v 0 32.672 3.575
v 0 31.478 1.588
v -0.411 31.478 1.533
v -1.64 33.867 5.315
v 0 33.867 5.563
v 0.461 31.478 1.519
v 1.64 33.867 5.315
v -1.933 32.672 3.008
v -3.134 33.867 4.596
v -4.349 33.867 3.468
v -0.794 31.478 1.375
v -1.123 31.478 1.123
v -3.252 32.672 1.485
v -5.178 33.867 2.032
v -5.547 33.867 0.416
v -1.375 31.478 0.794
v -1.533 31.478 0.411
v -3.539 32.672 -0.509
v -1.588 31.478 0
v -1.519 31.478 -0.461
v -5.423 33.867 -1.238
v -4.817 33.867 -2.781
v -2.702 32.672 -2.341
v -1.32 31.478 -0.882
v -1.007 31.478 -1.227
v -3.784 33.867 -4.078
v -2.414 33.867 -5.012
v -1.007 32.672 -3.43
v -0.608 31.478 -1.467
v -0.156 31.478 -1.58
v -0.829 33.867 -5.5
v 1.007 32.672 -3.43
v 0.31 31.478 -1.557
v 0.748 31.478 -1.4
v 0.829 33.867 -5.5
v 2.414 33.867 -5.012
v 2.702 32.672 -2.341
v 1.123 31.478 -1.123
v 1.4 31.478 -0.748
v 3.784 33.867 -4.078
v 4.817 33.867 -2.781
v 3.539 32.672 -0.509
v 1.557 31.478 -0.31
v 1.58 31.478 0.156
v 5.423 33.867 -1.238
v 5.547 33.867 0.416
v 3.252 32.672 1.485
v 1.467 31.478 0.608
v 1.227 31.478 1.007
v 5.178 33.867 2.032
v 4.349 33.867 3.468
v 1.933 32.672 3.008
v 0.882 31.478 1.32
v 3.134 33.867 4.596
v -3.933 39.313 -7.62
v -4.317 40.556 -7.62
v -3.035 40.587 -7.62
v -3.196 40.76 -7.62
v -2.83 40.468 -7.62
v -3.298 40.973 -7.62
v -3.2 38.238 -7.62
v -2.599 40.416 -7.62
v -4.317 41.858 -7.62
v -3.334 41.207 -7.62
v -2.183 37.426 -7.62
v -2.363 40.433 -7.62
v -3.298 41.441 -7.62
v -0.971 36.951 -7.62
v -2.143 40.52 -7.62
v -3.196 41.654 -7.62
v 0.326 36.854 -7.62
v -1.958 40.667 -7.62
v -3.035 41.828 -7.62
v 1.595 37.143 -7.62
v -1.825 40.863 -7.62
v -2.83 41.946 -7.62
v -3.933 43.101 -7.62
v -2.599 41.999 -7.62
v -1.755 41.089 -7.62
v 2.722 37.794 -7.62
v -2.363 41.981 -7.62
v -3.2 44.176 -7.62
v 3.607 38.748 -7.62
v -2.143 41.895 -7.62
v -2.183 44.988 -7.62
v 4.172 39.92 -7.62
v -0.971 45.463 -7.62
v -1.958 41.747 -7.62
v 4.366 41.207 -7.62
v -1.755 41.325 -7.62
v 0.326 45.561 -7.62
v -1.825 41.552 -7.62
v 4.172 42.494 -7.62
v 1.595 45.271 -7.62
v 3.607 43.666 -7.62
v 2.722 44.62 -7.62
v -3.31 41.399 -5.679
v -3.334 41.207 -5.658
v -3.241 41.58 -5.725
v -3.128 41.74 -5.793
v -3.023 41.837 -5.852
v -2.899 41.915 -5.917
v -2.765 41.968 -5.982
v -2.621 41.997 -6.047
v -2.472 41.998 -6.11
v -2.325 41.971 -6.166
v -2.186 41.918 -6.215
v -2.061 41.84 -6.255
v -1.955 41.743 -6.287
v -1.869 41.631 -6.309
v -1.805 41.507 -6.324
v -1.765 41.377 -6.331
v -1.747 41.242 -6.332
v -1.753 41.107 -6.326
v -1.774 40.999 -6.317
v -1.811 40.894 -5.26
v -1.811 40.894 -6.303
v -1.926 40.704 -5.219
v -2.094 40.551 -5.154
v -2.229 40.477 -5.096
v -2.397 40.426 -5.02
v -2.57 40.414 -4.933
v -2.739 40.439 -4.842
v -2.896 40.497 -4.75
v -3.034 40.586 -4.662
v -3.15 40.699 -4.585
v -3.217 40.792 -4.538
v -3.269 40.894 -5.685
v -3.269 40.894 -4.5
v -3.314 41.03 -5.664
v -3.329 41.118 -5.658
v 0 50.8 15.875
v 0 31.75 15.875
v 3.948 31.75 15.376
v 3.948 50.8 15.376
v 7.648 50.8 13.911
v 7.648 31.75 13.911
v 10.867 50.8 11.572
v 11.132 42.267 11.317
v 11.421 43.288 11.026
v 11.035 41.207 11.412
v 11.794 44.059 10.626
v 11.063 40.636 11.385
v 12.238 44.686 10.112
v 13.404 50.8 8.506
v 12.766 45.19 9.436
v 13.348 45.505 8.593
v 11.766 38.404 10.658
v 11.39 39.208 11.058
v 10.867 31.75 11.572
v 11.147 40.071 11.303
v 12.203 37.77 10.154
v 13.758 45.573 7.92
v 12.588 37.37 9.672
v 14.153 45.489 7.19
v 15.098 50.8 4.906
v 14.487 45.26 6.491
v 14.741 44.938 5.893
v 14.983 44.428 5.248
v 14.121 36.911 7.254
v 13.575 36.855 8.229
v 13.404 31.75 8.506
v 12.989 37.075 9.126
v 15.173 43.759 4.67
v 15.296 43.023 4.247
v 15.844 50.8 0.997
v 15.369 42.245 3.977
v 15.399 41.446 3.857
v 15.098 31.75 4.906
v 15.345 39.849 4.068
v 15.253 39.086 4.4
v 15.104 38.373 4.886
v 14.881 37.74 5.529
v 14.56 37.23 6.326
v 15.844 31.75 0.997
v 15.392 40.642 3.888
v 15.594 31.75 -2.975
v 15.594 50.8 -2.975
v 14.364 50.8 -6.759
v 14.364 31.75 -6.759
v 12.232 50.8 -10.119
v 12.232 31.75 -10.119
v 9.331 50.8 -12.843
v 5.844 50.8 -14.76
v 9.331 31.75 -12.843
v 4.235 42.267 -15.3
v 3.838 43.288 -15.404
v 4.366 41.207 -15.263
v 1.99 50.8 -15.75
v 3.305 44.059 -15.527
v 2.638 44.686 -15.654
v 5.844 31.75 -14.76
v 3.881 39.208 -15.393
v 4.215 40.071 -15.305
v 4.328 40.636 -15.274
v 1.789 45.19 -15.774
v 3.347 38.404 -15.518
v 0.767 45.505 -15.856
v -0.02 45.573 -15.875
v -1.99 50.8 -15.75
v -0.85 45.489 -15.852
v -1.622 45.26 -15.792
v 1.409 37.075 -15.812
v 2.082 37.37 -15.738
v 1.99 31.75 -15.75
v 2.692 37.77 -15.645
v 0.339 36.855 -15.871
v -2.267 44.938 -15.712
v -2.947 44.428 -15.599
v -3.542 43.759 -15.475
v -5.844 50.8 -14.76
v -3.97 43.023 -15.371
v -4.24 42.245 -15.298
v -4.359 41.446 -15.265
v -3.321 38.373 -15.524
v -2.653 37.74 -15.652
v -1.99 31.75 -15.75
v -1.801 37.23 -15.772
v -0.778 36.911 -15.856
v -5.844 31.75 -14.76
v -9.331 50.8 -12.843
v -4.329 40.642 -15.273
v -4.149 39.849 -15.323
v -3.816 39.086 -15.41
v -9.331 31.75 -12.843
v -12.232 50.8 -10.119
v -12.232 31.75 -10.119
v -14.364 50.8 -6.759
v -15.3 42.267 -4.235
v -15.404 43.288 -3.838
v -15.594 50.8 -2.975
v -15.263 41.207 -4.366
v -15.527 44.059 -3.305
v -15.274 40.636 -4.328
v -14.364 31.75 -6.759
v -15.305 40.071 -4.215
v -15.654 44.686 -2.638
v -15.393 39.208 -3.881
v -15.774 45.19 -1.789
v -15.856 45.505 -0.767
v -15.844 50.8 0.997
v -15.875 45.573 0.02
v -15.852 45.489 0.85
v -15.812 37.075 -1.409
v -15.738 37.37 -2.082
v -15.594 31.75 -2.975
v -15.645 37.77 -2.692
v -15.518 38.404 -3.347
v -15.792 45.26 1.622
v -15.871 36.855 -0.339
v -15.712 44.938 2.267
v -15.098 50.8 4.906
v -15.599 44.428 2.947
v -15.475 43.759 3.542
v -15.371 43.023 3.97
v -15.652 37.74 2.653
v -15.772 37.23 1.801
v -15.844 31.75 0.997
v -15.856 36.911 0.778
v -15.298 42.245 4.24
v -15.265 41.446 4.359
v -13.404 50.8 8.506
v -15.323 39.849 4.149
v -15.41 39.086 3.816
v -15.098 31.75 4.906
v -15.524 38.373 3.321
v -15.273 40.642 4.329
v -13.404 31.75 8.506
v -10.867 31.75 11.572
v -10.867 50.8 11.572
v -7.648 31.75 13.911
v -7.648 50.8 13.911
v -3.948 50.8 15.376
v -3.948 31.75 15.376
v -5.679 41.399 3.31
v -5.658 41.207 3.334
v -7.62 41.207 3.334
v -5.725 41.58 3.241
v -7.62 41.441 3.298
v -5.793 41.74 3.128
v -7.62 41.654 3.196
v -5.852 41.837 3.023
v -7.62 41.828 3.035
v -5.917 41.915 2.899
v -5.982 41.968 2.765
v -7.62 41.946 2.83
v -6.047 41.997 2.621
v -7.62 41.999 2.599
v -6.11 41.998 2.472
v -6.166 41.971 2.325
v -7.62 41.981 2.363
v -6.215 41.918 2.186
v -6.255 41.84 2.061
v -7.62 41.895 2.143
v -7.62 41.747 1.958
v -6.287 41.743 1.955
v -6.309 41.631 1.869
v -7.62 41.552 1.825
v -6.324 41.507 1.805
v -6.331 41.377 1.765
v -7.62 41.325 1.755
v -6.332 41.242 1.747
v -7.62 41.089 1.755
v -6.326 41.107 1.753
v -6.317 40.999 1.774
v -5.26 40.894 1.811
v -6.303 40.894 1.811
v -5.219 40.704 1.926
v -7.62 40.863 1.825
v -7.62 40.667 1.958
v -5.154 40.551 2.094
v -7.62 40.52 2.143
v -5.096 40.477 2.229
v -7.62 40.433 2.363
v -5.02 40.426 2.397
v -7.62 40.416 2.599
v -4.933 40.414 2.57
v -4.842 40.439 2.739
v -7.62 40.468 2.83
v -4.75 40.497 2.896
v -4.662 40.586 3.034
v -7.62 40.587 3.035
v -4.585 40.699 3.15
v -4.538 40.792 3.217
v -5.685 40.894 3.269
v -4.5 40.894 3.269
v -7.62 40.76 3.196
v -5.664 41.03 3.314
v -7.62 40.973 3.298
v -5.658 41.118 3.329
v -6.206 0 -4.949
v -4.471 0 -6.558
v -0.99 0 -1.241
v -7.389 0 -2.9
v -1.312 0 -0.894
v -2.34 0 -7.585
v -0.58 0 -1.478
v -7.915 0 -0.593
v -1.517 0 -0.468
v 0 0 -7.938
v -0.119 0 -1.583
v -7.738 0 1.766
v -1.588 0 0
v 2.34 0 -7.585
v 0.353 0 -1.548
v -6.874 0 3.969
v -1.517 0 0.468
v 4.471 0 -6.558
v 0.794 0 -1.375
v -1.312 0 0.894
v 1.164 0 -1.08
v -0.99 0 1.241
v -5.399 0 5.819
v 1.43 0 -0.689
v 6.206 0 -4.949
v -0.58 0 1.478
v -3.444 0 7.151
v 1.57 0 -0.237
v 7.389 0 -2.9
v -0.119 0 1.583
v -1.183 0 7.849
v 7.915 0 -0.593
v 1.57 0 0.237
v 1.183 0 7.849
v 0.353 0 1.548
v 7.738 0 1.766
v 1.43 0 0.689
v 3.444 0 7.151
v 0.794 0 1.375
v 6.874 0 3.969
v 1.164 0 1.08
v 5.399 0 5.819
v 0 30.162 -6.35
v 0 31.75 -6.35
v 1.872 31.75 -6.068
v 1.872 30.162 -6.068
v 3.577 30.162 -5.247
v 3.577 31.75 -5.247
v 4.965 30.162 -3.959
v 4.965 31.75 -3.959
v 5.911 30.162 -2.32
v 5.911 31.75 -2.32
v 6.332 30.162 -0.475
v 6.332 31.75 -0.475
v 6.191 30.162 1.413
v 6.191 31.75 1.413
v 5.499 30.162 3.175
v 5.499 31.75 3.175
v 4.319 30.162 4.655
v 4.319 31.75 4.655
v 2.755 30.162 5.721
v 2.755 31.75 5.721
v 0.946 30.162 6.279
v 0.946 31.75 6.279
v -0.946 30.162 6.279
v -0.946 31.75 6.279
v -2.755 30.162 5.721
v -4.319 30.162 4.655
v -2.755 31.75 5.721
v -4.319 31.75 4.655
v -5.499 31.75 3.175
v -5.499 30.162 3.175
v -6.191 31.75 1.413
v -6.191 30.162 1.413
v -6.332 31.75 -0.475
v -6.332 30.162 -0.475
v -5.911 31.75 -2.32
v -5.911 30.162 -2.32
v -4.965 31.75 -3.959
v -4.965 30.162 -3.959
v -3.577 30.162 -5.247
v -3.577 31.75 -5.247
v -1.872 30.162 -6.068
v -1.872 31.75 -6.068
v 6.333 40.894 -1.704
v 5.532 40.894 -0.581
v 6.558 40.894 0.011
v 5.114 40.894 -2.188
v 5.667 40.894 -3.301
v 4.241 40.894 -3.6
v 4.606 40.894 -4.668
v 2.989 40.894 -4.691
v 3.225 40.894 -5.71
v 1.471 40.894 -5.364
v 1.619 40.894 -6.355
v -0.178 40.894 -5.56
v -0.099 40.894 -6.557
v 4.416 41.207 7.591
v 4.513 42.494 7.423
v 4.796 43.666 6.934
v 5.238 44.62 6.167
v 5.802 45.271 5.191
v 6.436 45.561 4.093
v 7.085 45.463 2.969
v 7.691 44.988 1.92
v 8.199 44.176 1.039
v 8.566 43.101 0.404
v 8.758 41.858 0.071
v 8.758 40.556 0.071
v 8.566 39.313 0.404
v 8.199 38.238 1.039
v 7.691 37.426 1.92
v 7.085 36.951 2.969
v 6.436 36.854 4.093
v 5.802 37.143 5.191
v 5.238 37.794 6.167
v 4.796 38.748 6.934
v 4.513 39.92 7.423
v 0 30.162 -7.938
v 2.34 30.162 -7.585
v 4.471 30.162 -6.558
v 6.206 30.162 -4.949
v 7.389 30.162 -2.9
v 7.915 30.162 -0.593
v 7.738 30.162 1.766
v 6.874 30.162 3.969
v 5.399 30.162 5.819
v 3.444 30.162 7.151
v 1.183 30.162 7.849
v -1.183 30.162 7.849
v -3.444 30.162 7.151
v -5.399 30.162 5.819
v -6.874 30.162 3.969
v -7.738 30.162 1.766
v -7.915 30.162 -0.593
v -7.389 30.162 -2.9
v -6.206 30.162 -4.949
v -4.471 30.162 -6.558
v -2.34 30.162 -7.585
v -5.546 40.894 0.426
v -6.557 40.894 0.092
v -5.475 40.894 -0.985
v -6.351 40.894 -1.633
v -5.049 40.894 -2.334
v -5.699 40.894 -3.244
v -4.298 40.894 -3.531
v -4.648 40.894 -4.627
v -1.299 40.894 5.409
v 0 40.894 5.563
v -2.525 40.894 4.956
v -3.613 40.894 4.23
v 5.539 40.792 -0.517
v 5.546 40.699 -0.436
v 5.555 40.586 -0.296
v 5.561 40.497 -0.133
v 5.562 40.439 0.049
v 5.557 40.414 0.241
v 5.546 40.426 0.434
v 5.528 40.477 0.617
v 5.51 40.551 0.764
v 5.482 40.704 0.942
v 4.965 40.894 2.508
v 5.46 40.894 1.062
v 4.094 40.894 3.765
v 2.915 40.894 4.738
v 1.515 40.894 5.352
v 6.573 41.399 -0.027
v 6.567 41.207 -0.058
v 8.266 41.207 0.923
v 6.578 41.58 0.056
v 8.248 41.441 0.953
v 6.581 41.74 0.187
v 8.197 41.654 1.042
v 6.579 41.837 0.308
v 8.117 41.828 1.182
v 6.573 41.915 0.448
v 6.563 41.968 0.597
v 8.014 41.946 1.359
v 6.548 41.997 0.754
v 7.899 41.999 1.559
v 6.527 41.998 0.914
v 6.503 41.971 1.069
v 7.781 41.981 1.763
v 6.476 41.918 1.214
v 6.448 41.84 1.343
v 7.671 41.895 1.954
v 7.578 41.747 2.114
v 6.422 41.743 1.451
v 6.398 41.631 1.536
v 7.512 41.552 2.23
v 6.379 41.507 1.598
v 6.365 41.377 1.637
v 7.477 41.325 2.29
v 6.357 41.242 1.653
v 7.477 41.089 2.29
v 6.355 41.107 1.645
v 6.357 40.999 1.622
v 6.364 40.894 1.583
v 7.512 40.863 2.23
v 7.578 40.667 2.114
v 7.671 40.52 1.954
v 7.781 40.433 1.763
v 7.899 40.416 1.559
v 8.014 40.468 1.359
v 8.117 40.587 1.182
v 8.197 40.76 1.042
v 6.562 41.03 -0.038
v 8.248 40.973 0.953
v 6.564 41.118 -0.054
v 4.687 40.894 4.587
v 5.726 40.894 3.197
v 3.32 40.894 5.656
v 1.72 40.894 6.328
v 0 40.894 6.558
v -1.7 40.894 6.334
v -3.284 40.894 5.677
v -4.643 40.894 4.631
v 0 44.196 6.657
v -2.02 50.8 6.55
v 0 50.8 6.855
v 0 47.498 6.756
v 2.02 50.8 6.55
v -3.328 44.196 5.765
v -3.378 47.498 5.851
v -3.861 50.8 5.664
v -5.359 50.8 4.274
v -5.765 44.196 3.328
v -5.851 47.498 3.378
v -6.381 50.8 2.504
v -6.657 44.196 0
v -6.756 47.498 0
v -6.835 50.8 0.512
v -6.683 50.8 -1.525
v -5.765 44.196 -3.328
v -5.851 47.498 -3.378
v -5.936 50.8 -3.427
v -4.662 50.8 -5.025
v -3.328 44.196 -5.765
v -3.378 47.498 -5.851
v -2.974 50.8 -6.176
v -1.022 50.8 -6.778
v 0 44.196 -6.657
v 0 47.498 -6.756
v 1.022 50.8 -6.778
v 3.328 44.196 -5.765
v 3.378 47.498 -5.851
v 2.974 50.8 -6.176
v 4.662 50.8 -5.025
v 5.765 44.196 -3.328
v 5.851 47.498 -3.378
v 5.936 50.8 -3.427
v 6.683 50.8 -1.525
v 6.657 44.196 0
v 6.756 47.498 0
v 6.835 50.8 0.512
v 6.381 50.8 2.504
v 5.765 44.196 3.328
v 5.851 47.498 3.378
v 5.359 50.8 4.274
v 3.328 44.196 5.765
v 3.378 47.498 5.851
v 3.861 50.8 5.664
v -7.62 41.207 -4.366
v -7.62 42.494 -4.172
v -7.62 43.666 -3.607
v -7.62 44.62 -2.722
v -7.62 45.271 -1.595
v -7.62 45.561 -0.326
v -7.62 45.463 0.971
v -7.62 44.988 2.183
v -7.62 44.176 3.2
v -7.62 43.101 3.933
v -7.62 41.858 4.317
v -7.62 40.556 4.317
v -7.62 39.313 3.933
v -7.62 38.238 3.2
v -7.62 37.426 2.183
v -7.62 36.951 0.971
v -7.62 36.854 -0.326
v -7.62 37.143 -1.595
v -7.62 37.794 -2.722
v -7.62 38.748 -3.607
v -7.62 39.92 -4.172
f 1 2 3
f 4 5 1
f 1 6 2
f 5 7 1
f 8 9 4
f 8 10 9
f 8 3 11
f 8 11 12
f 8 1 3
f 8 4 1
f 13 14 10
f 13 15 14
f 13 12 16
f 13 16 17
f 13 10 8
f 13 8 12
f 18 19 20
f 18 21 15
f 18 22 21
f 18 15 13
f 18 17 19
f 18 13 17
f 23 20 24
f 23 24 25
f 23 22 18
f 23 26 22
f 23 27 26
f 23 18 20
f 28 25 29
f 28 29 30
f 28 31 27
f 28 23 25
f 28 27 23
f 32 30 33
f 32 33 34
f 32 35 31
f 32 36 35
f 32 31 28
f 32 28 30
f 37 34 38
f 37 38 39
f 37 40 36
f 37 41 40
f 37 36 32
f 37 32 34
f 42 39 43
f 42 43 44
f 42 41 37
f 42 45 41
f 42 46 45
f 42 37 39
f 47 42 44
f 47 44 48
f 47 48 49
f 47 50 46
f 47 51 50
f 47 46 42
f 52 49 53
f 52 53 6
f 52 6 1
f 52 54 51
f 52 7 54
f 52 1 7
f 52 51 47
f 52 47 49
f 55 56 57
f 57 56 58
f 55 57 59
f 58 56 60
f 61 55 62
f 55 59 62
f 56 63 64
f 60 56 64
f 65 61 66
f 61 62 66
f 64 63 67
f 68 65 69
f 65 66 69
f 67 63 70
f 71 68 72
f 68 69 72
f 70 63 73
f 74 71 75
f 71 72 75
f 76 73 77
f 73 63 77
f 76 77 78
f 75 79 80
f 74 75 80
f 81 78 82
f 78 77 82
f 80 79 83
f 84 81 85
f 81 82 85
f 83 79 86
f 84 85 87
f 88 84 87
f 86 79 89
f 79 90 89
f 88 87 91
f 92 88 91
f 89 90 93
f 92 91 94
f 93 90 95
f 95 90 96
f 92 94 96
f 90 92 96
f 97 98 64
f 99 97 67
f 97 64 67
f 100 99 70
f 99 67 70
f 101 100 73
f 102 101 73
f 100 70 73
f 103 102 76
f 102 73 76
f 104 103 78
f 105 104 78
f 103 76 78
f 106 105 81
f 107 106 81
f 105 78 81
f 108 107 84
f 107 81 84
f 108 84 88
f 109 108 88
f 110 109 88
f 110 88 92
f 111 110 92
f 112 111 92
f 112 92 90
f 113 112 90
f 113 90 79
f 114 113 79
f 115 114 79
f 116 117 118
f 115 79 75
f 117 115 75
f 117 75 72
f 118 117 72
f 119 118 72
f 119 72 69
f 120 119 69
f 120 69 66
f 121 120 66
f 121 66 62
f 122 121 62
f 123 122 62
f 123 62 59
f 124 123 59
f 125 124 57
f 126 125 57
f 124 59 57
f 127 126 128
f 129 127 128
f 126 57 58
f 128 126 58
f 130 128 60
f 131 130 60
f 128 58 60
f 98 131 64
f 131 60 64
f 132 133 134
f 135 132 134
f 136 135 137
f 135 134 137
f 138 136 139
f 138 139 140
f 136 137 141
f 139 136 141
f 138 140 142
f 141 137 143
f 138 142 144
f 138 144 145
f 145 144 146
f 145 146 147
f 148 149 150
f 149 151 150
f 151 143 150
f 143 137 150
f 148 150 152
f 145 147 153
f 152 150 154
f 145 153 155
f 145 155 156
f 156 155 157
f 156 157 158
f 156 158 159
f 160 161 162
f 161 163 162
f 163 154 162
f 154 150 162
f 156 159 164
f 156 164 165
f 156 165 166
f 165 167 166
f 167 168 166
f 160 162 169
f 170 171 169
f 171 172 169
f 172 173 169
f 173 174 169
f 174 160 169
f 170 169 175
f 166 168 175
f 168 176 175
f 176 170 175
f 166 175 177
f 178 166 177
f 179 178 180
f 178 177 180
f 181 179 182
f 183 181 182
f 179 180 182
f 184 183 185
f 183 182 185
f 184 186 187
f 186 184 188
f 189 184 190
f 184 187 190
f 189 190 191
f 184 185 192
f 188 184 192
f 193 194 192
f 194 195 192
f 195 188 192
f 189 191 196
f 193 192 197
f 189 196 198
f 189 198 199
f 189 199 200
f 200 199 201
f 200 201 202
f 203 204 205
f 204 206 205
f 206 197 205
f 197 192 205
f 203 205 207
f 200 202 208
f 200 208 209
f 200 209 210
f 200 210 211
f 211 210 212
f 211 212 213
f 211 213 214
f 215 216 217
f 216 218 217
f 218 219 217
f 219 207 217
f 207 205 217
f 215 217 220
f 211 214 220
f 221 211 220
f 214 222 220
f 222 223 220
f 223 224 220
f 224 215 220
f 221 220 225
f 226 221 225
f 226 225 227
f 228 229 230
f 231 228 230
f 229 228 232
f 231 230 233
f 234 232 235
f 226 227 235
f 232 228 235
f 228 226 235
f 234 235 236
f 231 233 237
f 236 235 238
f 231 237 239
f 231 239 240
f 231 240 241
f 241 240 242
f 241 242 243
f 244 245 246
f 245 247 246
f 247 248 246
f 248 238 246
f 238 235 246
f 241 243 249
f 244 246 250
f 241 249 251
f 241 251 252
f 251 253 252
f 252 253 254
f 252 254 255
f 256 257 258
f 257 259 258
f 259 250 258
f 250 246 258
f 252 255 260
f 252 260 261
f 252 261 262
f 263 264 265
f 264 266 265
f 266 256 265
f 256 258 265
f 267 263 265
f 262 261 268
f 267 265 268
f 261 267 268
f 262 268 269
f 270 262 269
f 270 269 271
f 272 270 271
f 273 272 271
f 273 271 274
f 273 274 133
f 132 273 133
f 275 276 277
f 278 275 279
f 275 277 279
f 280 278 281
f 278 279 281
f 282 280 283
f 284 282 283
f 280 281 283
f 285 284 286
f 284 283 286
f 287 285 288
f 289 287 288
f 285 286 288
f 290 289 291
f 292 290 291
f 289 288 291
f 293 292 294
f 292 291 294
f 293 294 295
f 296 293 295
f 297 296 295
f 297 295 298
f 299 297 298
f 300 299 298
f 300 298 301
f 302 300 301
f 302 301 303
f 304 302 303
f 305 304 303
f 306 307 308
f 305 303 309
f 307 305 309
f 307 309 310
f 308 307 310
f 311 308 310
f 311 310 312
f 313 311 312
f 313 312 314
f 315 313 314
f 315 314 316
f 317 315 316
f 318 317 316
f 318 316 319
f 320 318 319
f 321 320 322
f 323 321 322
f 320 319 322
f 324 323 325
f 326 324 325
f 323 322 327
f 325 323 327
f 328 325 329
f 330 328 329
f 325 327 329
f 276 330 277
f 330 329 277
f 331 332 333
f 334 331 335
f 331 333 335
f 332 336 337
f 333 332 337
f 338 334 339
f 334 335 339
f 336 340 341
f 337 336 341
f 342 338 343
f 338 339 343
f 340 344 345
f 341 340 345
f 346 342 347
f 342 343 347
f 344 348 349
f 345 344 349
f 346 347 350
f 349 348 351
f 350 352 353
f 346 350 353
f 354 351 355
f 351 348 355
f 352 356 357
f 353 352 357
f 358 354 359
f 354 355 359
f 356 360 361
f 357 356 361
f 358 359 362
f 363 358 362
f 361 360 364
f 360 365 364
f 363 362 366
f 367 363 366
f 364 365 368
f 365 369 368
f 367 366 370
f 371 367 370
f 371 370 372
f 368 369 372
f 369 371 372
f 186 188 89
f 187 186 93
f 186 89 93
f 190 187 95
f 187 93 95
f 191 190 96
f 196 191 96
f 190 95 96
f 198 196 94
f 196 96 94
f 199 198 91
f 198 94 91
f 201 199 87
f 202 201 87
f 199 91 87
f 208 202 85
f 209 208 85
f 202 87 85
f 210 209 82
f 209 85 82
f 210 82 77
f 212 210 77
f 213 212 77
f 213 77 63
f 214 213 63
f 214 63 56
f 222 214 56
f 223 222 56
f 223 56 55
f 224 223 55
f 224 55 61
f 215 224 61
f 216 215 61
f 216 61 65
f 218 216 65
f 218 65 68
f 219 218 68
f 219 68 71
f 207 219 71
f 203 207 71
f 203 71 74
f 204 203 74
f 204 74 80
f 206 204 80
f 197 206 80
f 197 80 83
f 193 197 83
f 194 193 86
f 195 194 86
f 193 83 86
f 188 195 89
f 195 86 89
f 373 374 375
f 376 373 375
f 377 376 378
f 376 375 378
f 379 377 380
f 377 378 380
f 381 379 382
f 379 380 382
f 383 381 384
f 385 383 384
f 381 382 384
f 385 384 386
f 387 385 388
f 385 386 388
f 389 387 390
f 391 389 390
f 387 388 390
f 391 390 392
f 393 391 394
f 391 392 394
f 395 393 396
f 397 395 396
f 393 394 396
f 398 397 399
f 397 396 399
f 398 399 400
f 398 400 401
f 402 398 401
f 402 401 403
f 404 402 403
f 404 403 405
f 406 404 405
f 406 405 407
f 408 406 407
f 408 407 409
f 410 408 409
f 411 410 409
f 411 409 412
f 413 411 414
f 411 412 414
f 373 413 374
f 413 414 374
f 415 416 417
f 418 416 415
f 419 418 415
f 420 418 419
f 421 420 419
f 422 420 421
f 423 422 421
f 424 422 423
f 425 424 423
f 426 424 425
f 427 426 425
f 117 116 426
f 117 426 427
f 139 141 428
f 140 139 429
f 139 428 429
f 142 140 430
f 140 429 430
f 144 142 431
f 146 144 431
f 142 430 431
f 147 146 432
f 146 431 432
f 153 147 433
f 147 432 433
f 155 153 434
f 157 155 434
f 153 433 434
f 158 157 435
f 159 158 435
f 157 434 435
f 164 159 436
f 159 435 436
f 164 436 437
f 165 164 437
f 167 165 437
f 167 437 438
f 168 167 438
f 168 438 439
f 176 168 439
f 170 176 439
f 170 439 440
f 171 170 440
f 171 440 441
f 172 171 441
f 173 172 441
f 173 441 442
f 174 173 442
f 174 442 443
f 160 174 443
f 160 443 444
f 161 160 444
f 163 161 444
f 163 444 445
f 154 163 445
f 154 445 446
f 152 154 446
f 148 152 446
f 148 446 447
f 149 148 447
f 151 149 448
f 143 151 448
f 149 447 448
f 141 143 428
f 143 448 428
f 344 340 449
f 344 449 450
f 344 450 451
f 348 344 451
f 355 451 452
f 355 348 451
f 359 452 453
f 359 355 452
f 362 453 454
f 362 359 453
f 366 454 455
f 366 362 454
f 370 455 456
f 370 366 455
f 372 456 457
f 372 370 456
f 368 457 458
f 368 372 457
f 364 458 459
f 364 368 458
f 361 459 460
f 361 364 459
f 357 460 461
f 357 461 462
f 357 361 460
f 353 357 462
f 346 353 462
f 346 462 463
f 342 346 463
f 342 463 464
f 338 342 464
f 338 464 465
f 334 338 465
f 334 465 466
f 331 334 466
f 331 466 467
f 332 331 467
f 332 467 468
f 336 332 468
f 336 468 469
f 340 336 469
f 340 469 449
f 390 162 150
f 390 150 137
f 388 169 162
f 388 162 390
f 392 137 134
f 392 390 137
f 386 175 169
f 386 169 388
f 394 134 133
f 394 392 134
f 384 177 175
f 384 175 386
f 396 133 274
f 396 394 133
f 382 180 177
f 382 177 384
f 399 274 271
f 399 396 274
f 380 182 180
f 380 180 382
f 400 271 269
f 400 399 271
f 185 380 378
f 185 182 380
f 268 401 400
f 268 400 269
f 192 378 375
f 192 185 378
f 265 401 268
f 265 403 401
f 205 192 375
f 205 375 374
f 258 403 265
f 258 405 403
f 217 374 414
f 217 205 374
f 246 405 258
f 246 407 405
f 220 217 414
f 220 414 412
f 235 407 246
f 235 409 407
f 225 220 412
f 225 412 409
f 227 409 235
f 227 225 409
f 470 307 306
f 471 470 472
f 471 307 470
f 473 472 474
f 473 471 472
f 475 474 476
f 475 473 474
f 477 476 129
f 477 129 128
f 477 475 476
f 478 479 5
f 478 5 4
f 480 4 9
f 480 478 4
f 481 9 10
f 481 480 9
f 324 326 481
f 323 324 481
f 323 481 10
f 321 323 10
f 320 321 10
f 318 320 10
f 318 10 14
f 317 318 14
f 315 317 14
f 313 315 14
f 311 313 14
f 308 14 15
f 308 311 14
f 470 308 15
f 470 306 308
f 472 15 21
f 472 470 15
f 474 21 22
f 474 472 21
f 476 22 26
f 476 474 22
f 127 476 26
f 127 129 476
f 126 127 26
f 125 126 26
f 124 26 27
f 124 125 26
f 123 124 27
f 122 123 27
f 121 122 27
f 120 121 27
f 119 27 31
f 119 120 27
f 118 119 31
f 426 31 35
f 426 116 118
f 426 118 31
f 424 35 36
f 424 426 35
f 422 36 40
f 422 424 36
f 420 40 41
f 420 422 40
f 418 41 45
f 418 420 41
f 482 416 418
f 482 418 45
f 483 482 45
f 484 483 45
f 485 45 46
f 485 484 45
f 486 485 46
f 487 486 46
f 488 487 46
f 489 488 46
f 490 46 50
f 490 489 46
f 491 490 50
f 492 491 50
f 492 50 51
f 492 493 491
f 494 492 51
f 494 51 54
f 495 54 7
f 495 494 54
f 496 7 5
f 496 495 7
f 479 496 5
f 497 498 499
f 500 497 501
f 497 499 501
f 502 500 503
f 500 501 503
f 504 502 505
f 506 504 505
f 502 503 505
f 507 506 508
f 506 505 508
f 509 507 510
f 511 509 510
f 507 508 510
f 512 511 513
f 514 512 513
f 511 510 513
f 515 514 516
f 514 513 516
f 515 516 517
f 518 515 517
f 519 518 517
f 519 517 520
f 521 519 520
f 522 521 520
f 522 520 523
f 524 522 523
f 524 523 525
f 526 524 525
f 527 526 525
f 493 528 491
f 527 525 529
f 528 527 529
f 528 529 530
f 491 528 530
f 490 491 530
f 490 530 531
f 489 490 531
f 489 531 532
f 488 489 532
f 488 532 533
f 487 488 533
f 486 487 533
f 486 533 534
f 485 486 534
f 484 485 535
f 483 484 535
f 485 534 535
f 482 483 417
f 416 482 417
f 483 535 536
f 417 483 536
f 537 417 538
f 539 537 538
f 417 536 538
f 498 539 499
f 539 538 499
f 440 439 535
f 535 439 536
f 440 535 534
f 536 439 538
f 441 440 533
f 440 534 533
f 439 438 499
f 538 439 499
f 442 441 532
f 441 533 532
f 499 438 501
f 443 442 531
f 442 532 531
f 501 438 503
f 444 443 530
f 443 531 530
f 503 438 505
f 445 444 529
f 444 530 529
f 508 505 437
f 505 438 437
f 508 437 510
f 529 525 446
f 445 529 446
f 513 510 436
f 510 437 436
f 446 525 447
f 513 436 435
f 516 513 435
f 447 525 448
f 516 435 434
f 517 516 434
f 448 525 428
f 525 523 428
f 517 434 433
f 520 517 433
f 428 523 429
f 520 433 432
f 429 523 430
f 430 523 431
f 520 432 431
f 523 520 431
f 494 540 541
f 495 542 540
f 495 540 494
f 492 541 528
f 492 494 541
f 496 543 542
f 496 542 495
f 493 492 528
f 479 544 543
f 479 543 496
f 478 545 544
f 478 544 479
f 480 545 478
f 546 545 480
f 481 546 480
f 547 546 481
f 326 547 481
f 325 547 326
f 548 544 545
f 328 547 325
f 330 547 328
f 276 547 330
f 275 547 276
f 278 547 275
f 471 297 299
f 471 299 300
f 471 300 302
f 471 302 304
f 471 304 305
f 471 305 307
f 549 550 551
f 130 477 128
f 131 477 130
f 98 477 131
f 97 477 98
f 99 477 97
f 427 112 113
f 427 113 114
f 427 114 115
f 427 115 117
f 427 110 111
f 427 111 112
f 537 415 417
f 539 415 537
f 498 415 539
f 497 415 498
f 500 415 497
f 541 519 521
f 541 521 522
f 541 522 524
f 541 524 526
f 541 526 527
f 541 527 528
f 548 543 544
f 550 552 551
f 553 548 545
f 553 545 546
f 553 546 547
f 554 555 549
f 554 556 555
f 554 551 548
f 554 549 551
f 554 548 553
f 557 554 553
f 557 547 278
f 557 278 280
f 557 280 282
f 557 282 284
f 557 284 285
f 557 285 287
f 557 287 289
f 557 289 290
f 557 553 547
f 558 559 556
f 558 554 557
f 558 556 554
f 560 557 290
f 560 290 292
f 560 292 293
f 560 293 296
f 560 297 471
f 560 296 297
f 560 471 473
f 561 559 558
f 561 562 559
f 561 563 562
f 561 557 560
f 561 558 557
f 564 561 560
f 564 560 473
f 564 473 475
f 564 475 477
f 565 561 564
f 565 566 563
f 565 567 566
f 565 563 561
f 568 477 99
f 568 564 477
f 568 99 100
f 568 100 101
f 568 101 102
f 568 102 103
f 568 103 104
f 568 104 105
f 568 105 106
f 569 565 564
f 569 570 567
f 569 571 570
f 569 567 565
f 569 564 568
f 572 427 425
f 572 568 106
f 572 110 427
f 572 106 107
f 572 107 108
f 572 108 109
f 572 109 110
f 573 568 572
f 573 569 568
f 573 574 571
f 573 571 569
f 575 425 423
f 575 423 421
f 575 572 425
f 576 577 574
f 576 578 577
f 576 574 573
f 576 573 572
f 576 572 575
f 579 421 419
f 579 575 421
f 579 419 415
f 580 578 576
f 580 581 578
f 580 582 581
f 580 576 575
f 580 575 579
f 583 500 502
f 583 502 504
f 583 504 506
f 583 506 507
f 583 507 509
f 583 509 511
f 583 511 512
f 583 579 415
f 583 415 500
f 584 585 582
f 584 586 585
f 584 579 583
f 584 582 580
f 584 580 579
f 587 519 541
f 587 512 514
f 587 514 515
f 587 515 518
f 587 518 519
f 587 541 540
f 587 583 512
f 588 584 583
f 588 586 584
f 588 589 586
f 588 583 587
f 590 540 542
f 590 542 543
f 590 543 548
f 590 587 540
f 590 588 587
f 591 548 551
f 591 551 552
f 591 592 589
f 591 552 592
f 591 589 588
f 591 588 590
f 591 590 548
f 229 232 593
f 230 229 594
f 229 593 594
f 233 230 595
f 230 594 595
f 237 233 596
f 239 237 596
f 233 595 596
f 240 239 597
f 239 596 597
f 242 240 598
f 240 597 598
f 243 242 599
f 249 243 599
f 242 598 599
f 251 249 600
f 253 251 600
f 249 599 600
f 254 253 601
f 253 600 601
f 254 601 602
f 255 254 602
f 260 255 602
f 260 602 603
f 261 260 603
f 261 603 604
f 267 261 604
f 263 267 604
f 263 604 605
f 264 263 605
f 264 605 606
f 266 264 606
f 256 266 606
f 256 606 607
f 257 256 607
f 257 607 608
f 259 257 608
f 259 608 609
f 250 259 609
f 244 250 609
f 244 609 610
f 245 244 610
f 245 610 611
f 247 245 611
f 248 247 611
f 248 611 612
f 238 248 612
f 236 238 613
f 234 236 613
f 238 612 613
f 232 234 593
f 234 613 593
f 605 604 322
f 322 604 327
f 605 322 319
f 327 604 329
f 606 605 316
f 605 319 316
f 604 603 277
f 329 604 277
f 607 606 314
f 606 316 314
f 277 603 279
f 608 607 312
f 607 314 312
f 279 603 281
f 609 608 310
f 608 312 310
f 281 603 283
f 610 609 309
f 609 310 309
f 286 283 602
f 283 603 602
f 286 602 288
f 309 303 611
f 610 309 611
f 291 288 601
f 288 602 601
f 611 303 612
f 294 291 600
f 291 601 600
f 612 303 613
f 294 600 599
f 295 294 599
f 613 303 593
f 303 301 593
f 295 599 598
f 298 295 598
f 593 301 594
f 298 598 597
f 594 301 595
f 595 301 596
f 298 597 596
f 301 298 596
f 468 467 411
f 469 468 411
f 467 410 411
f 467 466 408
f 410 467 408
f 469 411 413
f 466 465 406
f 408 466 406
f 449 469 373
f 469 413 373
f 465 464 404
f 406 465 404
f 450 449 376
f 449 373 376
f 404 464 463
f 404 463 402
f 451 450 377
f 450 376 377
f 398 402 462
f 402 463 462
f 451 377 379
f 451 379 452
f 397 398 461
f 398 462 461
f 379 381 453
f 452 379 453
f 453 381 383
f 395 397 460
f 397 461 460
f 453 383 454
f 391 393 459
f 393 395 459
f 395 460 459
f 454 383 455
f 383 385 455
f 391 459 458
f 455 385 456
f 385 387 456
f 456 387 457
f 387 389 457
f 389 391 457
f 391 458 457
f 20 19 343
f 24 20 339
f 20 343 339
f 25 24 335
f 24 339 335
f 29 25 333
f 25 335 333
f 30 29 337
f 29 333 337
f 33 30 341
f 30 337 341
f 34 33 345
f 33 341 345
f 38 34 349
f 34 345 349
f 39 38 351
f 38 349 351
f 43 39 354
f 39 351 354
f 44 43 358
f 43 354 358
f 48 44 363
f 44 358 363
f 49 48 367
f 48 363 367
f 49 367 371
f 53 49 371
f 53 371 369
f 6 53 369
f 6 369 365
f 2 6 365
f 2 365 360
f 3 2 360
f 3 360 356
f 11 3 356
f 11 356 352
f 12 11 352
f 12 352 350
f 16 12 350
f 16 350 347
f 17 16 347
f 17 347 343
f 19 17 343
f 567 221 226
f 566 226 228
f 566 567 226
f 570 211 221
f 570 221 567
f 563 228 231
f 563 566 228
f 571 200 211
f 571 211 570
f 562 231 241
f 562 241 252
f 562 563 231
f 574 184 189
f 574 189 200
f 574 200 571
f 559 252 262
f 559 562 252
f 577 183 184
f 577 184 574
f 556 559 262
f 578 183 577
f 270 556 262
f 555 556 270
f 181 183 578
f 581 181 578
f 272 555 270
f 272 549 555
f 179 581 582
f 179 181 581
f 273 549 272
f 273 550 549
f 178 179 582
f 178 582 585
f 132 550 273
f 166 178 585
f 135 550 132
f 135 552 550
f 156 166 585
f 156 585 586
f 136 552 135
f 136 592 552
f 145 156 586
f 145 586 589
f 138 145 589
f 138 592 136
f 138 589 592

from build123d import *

# Parameters (mm, degrees)
SKETCH1_R                    = 15.875
BOSS_EXTRUDE1_DEPTH          = 50.8
SKETCH2_OUTSIDE_W            = 47.31
SKETCH2_OUTSIDE_H            = 47.31
SKETCH2_OUTSIDE_R            = 7.9375
CUT_EXTRUDE1_DEPTH           = 31.75
F_1_8_0_125_DIAMETER_HOLE1_D = 3.175
CUT_EXTRUDE5_START           = -31.75
SKETCH13_OUTSIDE_W           = 47.31
SKETCH13_OUTSIDE_H           = 47.31
SKETCH13_OUTSIDE_R           = 6.35
CUT_EXTRUDE5_DEPTH           = 1.5875
CUT_EXTRUDE6_REACH           = 65.16
CUT_EXTRUDE6_END_RADIUS      = 15.875
CUT_EXTRUDE6_START           = -7.62
SKETCH15_R                   = 4.365625
CUT_EXTRUDE7_REACH           = 60.178
SKETCH16_R                   = 0.79375
CIRPATTERN1_COUNT            = 2
CIRPATTERN1_ANGLE            = 120
CIRPATTERN2_COUNT            = 2
CIRPATTERN2_ANGLE            = 270


with BuildPart() as part:
    # Sketch1 → Boss-Extrude1 (new body)
    with BuildSketch(Plane(origin=(0, 0, 0), x_dir=(1, 0, 0), z_dir=(0, 1, 0))):
        with Locations(Location((0, 0, 0), (0, 0, 270))):
            Circle(SKETCH1_R)
    extrude(amount=BOSS_EXTRUDE1_DEPTH)

    # Sketch2 outside → Cut-Extrude1 (cut)
    with BuildSketch(Plane(origin=(0, 0, 0), x_dir=(-1, 0, 0), z_dir=(0, -1, 0))):
        Rectangle(SKETCH2_OUTSIDE_W, SKETCH2_OUTSIDE_H)
        with Locations(Location((0, 0, 0), (0, 0, 90))):
            Circle(SKETCH2_OUTSIDE_R, mode=Mode.SUBTRACT)
    extrude(amount=-CUT_EXTRUDE1_DEPTH, mode=Mode.SUBTRACT)

    # 1/8 (0.125) Diameter Hole1 (through all)
    with Locations(Plane(origin=(0, 50.8, 0), x_dir=(1, 0, 0), z_dir=(0, 1, 0))):
        with Locations((0, 0)):
            Hole(F_1_8_0_125_DIAMETER_HOLE1_D / 2)

    # Sketch6 → 1/4 NPT Tapped Hole1 (revolve, cut)
    with BuildSketch(Plane(origin=(0, 50.8, 0), x_dir=(0, 0, 1), z_dir=(1, 0, 0))):
        Polygon((0, 0), (0, 20.275689079), (5.5626, 16.9333418), (5.5626, 9.906), (6.557984794, 9.906), (6.8545837, 0), align=None)
    revolve(axis=Axis((0, 57.15, 0), (0, -1, 0)), mode=Mode.SUBTRACT)

    # Sketch13 outside → Cut-Extrude5 (cut)
    with BuildSketch(Plane.XZ.offset(CUT_EXTRUDE5_START)):
        Rectangle(SKETCH13_OUTSIDE_W, SKETCH13_OUTSIDE_H)
        with Locations(Location((0, 0, 0), (0, 0, 270))):
            Circle(SKETCH13_OUTSIDE_R, mode=Mode.SUBTRACT)
    extrude(amount=CUT_EXTRUDE5_DEPTH, mode=Mode.SUBTRACT)

    # Cut-Extrude6: up to this cylinder (the profile starts inside it)
    cut_extrude6_end = Plane(origin=(0, 41.207118, 0), z_dir=(0, -1, 0)) * Cylinder(CUT_EXTRUDE6_END_RADIUS, 163.07, mode=Mode.PRIVATE)
    # Sketch15 → Cut-Extrude6 (cut, up to the surface)
    with BuildSketch(Plane.XY.offset(CUT_EXTRUDE6_START), mode=Mode.PRIVATE) as cut_extrude6_sk1:
        with Locations((0, 41.207117901)):
            Circle(SKETCH15_R)
    cut_extrude6_tool1 = extrude(cut_extrude6_sk1.sketch, amount=-CUT_EXTRUDE6_REACH, mode=Mode.PRIVATE) & cut_extrude6_end
    cut_extrude6 = cut_extrude6_tool1.solids().sort_by_distance((0, 41.207118, -7.62))[0]
    add(cut_extrude6, mode=Mode.SUBTRACT)

    # Sketch16 → Cut-Extrude7 (cut, up to next)
    with BuildSketch(Plane(origin=(0, 0, -7.62), x_dir=(-1, 0, 0), z_dir=(0, 0, -1)), mode=Mode.PRIVATE) as cut_extrude7_sk1:
        with Locations((2.54, 41.207117901)):
            Circle(SKETCH16_R)
    cut_extrude7_tool1 = extrude(cut_extrude7_sk1.sketch, amount=-CUT_EXTRUDE7_REACH, mode=Mode.PRIVATE) & part.part
    cut_extrude7 = cut_extrude7_tool1.solids().sort_by_distance((-2.54, 41.207118, -7.62))[0]
    add(cut_extrude7, mode=Mode.SUBTRACT)

    # CirPattern1: Cut-Extrude6, Cut-Extrude7 ×2 about axis
    cirpattern1_axis = Axis((0, 50.8, 0), (0, -1, 0))
    add([cut_extrude6.rotate(cirpattern1_axis, i * CIRPATTERN1_ANGLE / (CIRPATTERN1_COUNT - 1)) for i in range(1, CIRPATTERN1_COUNT)], mode=Mode.SUBTRACT)
    add([cut_extrude7.rotate(cirpattern1_axis, i * CIRPATTERN1_ANGLE / (CIRPATTERN1_COUNT - 1)) for i in range(1, CIRPATTERN1_COUNT)], mode=Mode.SUBTRACT)

    # CirPattern2: Cut-Extrude6, Cut-Extrude7 ×2 about axis
    cirpattern2_axis = Axis((0, 50.8, 0), (0, -1, 0))
    add([cut_extrude6.rotate(cirpattern2_axis, i * CIRPATTERN2_ANGLE / (CIRPATTERN2_COUNT - 1)) for i in range(1, CIRPATTERN2_COUNT)], mode=Mode.SUBTRACT)
    add([cut_extrude7.rotate(cirpattern2_axis, i * CIRPATTERN2_ANGLE / (CIRPATTERN2_COUNT - 1)) for i in range(1, CIRPATTERN2_COUNT)], mode=Mode.SUBTRACT)


solid = part.part
